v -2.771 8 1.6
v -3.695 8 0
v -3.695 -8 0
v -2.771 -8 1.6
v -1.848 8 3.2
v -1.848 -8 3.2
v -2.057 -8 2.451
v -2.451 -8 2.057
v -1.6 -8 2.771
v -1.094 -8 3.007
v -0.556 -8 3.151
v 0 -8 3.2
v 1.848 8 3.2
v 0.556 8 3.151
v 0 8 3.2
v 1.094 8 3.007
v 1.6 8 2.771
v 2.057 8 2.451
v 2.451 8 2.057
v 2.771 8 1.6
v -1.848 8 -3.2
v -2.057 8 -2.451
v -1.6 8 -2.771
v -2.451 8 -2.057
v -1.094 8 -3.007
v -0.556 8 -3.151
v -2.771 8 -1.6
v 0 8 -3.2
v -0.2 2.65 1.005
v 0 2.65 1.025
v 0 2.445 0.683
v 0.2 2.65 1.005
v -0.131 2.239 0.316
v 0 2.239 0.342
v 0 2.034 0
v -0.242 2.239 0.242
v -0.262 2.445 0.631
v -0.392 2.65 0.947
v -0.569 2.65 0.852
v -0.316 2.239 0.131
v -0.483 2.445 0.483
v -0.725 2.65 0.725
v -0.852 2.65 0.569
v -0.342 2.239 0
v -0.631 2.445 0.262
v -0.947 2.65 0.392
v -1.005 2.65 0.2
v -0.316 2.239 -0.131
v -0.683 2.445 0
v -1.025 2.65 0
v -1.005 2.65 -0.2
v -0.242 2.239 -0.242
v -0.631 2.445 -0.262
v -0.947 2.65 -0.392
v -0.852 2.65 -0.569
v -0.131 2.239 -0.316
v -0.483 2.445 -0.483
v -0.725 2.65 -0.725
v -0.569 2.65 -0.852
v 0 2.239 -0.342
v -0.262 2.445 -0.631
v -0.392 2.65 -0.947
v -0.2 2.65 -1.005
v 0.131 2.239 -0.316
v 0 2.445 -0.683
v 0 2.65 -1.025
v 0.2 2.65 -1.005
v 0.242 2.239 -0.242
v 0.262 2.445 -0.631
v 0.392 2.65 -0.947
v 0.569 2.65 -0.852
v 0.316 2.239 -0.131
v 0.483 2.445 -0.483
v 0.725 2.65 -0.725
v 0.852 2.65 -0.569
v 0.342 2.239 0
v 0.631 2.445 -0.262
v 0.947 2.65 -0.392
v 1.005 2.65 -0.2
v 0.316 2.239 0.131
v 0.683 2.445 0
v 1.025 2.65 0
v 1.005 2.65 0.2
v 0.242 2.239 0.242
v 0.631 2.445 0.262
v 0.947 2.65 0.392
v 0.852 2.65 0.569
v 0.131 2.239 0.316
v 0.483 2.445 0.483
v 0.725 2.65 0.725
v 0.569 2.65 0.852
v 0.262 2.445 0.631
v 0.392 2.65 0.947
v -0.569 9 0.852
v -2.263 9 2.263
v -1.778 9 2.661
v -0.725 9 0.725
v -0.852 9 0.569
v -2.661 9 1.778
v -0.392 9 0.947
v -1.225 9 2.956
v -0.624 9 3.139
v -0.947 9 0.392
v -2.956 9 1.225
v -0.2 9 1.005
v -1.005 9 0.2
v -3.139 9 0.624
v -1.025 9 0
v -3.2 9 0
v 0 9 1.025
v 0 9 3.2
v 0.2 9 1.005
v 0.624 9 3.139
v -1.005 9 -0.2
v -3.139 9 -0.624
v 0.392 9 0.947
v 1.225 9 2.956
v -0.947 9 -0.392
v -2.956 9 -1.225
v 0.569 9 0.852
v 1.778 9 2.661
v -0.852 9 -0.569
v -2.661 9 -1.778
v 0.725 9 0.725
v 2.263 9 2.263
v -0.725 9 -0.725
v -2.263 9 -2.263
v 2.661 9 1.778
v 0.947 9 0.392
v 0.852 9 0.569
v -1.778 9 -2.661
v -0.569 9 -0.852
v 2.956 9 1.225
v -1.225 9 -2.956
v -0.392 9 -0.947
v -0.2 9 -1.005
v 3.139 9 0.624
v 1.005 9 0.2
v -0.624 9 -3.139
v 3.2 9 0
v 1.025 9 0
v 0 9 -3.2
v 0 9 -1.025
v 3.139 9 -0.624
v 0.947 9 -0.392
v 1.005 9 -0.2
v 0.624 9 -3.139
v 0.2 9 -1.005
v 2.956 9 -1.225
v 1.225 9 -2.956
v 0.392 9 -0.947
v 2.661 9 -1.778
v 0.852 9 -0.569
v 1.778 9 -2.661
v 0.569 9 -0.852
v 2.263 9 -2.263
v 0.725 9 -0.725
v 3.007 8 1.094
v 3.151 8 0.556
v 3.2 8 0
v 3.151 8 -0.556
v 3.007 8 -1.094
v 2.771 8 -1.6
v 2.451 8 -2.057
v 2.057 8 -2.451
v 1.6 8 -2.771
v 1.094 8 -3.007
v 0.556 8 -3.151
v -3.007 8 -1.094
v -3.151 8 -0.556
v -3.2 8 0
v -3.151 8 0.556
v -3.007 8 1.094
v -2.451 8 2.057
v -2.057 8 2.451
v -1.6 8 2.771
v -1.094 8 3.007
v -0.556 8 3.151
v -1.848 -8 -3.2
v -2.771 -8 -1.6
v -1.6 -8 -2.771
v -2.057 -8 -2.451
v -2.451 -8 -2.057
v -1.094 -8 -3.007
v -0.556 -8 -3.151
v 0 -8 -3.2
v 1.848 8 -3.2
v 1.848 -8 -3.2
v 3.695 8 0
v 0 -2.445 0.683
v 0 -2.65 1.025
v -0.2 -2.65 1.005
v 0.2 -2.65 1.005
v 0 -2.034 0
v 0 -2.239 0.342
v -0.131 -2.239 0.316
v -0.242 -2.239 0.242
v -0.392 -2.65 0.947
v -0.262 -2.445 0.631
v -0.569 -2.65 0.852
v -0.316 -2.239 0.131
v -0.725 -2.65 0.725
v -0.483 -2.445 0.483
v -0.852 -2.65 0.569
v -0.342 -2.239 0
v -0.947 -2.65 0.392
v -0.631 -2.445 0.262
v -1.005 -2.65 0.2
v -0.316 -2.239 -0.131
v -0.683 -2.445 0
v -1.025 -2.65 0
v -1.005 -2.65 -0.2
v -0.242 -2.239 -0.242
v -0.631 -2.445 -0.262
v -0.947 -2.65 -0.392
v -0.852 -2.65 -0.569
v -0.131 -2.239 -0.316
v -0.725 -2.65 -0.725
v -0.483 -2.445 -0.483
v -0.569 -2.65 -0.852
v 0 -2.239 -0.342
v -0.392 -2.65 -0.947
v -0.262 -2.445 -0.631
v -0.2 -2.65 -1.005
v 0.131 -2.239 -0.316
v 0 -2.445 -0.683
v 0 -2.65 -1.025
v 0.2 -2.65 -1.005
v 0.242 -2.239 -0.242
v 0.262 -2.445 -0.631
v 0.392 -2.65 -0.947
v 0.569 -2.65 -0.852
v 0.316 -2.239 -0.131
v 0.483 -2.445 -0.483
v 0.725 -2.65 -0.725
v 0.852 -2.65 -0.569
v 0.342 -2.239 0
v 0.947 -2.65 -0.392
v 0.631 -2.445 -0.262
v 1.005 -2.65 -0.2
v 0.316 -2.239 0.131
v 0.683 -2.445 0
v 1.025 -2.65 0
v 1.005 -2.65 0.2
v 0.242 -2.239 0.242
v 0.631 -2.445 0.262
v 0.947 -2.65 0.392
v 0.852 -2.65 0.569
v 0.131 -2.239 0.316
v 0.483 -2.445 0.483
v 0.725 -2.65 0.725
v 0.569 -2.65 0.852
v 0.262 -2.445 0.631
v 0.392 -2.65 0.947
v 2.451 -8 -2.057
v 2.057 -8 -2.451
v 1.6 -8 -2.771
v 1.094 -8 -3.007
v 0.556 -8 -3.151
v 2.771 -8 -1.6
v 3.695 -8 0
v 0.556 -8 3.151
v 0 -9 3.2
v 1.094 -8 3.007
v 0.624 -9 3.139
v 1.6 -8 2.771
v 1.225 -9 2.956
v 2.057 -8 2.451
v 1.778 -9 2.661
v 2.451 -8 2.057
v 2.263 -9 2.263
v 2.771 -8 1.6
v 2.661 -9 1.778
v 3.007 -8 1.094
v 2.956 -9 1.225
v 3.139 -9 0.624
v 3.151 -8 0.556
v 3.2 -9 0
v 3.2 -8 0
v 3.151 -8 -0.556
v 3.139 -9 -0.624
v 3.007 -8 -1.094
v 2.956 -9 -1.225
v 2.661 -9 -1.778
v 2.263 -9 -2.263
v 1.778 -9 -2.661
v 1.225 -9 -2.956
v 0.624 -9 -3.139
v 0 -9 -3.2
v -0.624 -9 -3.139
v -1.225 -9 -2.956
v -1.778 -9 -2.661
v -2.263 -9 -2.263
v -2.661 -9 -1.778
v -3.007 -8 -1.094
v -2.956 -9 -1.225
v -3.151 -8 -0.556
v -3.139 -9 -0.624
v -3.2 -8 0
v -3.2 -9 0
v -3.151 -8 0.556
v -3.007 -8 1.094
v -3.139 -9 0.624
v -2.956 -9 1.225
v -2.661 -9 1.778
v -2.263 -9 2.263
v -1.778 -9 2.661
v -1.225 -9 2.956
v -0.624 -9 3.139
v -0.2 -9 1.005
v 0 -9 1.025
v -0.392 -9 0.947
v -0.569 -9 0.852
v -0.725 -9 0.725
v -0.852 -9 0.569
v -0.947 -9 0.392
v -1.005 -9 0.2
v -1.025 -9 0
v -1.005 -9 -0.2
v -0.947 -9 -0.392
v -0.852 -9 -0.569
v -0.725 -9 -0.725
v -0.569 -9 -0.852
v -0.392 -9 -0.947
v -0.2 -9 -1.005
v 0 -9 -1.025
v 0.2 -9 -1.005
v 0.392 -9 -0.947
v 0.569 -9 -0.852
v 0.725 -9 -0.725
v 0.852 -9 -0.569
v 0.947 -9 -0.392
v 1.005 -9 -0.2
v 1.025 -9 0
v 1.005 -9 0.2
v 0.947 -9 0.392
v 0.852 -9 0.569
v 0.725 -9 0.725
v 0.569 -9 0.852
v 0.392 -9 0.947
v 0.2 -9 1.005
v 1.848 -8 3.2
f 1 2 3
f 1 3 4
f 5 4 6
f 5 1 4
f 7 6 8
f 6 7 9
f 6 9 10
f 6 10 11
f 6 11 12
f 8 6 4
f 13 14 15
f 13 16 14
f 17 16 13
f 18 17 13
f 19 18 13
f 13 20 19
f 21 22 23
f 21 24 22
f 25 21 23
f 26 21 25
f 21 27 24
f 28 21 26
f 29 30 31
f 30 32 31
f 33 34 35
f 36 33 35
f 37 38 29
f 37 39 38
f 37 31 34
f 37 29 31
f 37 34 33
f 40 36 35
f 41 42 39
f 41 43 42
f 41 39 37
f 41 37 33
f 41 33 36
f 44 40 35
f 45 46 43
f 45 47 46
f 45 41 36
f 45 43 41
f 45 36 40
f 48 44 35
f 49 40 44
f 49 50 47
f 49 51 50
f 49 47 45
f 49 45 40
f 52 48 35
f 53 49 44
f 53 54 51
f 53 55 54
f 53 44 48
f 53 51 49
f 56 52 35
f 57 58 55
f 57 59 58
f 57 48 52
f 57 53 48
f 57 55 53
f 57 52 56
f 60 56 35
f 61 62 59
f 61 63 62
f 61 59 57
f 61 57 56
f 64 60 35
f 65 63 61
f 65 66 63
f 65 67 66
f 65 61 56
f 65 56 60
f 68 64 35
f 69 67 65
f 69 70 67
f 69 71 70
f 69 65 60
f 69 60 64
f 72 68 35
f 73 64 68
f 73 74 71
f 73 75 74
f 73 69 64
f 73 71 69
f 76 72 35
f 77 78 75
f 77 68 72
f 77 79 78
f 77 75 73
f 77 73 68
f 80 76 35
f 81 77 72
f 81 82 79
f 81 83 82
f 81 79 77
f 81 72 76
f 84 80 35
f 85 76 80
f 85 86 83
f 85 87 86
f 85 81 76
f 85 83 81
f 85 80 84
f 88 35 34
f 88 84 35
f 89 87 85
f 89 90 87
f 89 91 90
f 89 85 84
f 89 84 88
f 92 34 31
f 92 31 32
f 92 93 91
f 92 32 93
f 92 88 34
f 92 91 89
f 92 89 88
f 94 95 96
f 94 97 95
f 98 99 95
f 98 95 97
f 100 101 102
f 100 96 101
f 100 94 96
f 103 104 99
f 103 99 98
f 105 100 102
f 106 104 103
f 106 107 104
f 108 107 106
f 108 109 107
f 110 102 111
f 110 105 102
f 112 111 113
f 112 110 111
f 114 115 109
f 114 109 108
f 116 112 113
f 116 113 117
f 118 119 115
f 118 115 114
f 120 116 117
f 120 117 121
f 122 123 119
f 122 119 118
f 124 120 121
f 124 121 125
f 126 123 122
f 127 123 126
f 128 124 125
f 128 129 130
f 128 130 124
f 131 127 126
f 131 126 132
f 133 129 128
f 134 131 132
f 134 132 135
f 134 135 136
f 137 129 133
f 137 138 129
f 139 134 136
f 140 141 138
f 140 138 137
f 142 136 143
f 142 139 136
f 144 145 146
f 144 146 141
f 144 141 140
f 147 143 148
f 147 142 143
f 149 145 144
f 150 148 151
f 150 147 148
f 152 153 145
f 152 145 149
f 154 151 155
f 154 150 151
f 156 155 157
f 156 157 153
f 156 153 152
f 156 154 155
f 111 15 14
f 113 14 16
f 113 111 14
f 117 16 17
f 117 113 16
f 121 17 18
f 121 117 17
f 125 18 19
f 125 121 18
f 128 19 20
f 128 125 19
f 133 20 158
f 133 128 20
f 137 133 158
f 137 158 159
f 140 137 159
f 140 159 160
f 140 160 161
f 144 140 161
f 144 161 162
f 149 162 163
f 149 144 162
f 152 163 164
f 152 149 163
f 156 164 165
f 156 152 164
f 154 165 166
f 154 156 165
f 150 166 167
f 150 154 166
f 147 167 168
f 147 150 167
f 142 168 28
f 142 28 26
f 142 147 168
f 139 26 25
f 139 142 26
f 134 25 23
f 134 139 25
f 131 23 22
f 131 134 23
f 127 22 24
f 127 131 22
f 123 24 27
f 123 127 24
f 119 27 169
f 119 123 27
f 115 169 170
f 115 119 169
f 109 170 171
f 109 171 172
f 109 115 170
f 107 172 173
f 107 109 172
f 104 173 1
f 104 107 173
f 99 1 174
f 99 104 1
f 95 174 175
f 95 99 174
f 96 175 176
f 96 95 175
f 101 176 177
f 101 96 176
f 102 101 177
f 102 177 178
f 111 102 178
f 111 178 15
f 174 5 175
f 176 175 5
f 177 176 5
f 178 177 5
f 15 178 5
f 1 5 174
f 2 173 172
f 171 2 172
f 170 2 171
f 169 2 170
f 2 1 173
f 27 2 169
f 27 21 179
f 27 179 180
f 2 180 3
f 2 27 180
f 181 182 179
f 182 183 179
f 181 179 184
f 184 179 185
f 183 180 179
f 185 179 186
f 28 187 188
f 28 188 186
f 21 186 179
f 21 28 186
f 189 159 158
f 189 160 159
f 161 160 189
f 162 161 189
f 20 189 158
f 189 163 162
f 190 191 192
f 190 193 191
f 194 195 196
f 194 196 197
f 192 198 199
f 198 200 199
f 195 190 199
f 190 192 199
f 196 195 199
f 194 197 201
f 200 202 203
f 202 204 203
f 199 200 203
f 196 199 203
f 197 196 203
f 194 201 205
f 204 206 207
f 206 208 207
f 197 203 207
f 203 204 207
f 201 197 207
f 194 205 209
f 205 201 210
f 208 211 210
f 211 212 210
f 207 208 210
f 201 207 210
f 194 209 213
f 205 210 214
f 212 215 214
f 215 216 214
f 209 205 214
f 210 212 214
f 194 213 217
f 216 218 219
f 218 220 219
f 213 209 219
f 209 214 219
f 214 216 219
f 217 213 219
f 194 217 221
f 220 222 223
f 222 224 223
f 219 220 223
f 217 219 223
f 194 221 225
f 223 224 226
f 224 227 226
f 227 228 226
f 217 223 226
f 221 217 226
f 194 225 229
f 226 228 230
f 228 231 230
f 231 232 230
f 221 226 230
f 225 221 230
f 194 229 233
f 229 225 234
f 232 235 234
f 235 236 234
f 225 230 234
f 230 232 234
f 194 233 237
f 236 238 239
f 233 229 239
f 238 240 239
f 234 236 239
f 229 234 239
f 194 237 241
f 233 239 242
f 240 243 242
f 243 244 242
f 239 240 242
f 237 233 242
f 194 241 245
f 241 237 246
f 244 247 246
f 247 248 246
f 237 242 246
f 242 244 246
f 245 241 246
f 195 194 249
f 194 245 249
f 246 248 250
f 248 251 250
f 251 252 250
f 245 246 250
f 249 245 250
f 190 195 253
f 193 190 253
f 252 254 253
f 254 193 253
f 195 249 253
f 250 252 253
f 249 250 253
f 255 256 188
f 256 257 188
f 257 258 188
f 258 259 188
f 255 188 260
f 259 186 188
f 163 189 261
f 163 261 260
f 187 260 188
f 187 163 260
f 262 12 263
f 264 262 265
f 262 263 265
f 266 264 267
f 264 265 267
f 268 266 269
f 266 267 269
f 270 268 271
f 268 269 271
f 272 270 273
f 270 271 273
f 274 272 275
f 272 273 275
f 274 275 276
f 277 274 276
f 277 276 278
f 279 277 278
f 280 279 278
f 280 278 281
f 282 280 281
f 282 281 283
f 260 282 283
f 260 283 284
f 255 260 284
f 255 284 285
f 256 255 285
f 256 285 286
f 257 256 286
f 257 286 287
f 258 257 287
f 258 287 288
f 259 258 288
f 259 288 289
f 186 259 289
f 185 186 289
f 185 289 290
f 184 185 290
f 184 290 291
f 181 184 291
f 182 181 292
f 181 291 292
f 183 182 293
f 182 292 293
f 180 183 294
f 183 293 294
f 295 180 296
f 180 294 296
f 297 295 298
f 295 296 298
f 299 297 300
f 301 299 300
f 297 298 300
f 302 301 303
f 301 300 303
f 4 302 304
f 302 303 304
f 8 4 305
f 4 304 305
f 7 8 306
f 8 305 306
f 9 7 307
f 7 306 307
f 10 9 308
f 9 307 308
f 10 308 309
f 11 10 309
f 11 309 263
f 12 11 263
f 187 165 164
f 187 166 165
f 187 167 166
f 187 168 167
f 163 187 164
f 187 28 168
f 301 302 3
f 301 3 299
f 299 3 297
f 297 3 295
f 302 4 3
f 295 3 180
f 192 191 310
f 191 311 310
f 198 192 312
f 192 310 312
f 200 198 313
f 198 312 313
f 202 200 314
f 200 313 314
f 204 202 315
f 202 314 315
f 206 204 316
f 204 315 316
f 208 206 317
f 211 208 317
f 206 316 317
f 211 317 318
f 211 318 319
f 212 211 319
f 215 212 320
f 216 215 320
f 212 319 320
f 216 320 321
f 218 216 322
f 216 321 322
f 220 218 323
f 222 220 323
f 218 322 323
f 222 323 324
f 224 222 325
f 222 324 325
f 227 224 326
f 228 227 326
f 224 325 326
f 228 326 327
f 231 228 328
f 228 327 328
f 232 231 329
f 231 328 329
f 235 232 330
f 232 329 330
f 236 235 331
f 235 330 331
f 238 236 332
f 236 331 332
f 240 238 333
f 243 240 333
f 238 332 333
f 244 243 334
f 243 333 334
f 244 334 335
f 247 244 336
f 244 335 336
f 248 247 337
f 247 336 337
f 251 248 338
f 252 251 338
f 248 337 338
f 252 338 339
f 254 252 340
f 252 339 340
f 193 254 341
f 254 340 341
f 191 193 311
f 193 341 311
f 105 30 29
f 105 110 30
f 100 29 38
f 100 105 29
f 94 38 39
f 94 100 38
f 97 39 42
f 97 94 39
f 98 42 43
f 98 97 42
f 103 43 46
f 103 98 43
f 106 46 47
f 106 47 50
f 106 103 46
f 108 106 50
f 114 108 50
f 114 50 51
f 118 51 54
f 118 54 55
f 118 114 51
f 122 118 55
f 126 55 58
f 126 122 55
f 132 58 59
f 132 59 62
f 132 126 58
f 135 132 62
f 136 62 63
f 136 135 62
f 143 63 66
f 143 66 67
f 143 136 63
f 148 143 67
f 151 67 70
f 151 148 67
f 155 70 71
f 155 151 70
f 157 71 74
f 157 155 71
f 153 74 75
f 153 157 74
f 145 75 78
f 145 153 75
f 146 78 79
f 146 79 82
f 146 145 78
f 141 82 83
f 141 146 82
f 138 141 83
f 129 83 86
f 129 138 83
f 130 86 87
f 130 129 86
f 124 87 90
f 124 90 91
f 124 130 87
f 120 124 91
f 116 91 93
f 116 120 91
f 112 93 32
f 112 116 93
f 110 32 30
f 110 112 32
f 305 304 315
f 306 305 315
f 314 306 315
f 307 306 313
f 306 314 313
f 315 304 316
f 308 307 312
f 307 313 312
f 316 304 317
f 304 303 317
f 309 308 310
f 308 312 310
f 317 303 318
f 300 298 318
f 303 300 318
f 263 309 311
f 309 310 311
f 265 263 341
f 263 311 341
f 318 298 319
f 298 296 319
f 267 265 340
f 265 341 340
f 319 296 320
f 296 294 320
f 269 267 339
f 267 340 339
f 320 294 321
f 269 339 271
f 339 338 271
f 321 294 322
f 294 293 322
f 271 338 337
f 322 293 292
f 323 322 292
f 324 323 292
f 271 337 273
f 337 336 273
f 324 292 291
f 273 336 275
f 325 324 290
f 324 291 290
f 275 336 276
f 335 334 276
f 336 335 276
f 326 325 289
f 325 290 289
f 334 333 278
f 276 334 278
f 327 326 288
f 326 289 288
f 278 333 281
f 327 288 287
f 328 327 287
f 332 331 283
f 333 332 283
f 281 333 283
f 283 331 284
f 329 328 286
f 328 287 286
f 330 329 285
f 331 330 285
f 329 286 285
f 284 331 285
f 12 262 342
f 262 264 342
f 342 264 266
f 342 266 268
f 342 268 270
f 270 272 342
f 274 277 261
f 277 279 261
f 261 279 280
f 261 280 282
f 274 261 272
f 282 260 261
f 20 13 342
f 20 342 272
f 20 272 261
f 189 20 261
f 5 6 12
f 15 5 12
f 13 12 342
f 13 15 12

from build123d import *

# Parameters (mm, degrees)
BOSS_EXTRUDE1_DEPTH = 9
SKETCH3_OUTSIDE_W   = 13.486
SKETCH3_OUTSIDE_H   = 12.496
SKETCH3_OUTSIDE_R   = 3.2
CUT_EXTRUDE1_DEPTH  = 1


with BuildPart() as part:
    # Sketch1 → Boss-Extrude1 (new, symmetric)
    with BuildSketch(Plane(origin=(0, 0, 0), x_dir=(1, 0, 0), z_dir=(0, 1, 0))):
        Polygon((3.695041723, 0), (1.847520861, 3.2), (-1.847520861, 3.2), (-3.695041723, 0), (-1.847520861, -3.2), (1.847520861, -3.2), align=None)
    extrude(amount=BOSS_EXTRUDE1_DEPTH, both=True)

    # Sketch3 outside → Cut-Extrude1 (cut)
    with BuildSketch(Plane(origin=(0, 9, 0), x_dir=(1, 0, 0), z_dir=(0, 1, 0))):
        Rectangle(SKETCH3_OUTSIDE_W, SKETCH3_OUTSIDE_H)
        with Locations(Location((0, 0, 0), (0, 0, 270))):
            Circle(SKETCH3_OUTSIDE_R, mode=Mode.SUBTRACT)
    cut_extrude1 = extrude(amount=-CUT_EXTRUDE1_DEPTH, mode=Mode.SUBTRACT)

    # Mirror2: Cut-Extrude1 across plane
    add(cut_extrude1.mirror(Plane.ZX), mode=Mode.SUBTRACT)

    # Sketch2 → M2.5 Tapped Hole1 (revolve, cut)
    with BuildSketch(Plane(origin=(0, 9, 0), x_dir=(0, 0, 1), z_dir=(1, 0, 0))):
        Polygon((0, 0), (0, 6.965882135), (1.025, 6.35), (1.025, 0), align=None)
    m2_5_tapped_hole1 = revolve(axis=Axis((0, 15.35, 0), (0, -1, 0)), mode=Mode.SUBTRACT)

    # Mirror1: M2.5 Tapped Hole1 across plane
    add(m2_5_tapped_hole1.mirror(Plane.ZX), mode=Mode.SUBTRACT)


solid = part.part
